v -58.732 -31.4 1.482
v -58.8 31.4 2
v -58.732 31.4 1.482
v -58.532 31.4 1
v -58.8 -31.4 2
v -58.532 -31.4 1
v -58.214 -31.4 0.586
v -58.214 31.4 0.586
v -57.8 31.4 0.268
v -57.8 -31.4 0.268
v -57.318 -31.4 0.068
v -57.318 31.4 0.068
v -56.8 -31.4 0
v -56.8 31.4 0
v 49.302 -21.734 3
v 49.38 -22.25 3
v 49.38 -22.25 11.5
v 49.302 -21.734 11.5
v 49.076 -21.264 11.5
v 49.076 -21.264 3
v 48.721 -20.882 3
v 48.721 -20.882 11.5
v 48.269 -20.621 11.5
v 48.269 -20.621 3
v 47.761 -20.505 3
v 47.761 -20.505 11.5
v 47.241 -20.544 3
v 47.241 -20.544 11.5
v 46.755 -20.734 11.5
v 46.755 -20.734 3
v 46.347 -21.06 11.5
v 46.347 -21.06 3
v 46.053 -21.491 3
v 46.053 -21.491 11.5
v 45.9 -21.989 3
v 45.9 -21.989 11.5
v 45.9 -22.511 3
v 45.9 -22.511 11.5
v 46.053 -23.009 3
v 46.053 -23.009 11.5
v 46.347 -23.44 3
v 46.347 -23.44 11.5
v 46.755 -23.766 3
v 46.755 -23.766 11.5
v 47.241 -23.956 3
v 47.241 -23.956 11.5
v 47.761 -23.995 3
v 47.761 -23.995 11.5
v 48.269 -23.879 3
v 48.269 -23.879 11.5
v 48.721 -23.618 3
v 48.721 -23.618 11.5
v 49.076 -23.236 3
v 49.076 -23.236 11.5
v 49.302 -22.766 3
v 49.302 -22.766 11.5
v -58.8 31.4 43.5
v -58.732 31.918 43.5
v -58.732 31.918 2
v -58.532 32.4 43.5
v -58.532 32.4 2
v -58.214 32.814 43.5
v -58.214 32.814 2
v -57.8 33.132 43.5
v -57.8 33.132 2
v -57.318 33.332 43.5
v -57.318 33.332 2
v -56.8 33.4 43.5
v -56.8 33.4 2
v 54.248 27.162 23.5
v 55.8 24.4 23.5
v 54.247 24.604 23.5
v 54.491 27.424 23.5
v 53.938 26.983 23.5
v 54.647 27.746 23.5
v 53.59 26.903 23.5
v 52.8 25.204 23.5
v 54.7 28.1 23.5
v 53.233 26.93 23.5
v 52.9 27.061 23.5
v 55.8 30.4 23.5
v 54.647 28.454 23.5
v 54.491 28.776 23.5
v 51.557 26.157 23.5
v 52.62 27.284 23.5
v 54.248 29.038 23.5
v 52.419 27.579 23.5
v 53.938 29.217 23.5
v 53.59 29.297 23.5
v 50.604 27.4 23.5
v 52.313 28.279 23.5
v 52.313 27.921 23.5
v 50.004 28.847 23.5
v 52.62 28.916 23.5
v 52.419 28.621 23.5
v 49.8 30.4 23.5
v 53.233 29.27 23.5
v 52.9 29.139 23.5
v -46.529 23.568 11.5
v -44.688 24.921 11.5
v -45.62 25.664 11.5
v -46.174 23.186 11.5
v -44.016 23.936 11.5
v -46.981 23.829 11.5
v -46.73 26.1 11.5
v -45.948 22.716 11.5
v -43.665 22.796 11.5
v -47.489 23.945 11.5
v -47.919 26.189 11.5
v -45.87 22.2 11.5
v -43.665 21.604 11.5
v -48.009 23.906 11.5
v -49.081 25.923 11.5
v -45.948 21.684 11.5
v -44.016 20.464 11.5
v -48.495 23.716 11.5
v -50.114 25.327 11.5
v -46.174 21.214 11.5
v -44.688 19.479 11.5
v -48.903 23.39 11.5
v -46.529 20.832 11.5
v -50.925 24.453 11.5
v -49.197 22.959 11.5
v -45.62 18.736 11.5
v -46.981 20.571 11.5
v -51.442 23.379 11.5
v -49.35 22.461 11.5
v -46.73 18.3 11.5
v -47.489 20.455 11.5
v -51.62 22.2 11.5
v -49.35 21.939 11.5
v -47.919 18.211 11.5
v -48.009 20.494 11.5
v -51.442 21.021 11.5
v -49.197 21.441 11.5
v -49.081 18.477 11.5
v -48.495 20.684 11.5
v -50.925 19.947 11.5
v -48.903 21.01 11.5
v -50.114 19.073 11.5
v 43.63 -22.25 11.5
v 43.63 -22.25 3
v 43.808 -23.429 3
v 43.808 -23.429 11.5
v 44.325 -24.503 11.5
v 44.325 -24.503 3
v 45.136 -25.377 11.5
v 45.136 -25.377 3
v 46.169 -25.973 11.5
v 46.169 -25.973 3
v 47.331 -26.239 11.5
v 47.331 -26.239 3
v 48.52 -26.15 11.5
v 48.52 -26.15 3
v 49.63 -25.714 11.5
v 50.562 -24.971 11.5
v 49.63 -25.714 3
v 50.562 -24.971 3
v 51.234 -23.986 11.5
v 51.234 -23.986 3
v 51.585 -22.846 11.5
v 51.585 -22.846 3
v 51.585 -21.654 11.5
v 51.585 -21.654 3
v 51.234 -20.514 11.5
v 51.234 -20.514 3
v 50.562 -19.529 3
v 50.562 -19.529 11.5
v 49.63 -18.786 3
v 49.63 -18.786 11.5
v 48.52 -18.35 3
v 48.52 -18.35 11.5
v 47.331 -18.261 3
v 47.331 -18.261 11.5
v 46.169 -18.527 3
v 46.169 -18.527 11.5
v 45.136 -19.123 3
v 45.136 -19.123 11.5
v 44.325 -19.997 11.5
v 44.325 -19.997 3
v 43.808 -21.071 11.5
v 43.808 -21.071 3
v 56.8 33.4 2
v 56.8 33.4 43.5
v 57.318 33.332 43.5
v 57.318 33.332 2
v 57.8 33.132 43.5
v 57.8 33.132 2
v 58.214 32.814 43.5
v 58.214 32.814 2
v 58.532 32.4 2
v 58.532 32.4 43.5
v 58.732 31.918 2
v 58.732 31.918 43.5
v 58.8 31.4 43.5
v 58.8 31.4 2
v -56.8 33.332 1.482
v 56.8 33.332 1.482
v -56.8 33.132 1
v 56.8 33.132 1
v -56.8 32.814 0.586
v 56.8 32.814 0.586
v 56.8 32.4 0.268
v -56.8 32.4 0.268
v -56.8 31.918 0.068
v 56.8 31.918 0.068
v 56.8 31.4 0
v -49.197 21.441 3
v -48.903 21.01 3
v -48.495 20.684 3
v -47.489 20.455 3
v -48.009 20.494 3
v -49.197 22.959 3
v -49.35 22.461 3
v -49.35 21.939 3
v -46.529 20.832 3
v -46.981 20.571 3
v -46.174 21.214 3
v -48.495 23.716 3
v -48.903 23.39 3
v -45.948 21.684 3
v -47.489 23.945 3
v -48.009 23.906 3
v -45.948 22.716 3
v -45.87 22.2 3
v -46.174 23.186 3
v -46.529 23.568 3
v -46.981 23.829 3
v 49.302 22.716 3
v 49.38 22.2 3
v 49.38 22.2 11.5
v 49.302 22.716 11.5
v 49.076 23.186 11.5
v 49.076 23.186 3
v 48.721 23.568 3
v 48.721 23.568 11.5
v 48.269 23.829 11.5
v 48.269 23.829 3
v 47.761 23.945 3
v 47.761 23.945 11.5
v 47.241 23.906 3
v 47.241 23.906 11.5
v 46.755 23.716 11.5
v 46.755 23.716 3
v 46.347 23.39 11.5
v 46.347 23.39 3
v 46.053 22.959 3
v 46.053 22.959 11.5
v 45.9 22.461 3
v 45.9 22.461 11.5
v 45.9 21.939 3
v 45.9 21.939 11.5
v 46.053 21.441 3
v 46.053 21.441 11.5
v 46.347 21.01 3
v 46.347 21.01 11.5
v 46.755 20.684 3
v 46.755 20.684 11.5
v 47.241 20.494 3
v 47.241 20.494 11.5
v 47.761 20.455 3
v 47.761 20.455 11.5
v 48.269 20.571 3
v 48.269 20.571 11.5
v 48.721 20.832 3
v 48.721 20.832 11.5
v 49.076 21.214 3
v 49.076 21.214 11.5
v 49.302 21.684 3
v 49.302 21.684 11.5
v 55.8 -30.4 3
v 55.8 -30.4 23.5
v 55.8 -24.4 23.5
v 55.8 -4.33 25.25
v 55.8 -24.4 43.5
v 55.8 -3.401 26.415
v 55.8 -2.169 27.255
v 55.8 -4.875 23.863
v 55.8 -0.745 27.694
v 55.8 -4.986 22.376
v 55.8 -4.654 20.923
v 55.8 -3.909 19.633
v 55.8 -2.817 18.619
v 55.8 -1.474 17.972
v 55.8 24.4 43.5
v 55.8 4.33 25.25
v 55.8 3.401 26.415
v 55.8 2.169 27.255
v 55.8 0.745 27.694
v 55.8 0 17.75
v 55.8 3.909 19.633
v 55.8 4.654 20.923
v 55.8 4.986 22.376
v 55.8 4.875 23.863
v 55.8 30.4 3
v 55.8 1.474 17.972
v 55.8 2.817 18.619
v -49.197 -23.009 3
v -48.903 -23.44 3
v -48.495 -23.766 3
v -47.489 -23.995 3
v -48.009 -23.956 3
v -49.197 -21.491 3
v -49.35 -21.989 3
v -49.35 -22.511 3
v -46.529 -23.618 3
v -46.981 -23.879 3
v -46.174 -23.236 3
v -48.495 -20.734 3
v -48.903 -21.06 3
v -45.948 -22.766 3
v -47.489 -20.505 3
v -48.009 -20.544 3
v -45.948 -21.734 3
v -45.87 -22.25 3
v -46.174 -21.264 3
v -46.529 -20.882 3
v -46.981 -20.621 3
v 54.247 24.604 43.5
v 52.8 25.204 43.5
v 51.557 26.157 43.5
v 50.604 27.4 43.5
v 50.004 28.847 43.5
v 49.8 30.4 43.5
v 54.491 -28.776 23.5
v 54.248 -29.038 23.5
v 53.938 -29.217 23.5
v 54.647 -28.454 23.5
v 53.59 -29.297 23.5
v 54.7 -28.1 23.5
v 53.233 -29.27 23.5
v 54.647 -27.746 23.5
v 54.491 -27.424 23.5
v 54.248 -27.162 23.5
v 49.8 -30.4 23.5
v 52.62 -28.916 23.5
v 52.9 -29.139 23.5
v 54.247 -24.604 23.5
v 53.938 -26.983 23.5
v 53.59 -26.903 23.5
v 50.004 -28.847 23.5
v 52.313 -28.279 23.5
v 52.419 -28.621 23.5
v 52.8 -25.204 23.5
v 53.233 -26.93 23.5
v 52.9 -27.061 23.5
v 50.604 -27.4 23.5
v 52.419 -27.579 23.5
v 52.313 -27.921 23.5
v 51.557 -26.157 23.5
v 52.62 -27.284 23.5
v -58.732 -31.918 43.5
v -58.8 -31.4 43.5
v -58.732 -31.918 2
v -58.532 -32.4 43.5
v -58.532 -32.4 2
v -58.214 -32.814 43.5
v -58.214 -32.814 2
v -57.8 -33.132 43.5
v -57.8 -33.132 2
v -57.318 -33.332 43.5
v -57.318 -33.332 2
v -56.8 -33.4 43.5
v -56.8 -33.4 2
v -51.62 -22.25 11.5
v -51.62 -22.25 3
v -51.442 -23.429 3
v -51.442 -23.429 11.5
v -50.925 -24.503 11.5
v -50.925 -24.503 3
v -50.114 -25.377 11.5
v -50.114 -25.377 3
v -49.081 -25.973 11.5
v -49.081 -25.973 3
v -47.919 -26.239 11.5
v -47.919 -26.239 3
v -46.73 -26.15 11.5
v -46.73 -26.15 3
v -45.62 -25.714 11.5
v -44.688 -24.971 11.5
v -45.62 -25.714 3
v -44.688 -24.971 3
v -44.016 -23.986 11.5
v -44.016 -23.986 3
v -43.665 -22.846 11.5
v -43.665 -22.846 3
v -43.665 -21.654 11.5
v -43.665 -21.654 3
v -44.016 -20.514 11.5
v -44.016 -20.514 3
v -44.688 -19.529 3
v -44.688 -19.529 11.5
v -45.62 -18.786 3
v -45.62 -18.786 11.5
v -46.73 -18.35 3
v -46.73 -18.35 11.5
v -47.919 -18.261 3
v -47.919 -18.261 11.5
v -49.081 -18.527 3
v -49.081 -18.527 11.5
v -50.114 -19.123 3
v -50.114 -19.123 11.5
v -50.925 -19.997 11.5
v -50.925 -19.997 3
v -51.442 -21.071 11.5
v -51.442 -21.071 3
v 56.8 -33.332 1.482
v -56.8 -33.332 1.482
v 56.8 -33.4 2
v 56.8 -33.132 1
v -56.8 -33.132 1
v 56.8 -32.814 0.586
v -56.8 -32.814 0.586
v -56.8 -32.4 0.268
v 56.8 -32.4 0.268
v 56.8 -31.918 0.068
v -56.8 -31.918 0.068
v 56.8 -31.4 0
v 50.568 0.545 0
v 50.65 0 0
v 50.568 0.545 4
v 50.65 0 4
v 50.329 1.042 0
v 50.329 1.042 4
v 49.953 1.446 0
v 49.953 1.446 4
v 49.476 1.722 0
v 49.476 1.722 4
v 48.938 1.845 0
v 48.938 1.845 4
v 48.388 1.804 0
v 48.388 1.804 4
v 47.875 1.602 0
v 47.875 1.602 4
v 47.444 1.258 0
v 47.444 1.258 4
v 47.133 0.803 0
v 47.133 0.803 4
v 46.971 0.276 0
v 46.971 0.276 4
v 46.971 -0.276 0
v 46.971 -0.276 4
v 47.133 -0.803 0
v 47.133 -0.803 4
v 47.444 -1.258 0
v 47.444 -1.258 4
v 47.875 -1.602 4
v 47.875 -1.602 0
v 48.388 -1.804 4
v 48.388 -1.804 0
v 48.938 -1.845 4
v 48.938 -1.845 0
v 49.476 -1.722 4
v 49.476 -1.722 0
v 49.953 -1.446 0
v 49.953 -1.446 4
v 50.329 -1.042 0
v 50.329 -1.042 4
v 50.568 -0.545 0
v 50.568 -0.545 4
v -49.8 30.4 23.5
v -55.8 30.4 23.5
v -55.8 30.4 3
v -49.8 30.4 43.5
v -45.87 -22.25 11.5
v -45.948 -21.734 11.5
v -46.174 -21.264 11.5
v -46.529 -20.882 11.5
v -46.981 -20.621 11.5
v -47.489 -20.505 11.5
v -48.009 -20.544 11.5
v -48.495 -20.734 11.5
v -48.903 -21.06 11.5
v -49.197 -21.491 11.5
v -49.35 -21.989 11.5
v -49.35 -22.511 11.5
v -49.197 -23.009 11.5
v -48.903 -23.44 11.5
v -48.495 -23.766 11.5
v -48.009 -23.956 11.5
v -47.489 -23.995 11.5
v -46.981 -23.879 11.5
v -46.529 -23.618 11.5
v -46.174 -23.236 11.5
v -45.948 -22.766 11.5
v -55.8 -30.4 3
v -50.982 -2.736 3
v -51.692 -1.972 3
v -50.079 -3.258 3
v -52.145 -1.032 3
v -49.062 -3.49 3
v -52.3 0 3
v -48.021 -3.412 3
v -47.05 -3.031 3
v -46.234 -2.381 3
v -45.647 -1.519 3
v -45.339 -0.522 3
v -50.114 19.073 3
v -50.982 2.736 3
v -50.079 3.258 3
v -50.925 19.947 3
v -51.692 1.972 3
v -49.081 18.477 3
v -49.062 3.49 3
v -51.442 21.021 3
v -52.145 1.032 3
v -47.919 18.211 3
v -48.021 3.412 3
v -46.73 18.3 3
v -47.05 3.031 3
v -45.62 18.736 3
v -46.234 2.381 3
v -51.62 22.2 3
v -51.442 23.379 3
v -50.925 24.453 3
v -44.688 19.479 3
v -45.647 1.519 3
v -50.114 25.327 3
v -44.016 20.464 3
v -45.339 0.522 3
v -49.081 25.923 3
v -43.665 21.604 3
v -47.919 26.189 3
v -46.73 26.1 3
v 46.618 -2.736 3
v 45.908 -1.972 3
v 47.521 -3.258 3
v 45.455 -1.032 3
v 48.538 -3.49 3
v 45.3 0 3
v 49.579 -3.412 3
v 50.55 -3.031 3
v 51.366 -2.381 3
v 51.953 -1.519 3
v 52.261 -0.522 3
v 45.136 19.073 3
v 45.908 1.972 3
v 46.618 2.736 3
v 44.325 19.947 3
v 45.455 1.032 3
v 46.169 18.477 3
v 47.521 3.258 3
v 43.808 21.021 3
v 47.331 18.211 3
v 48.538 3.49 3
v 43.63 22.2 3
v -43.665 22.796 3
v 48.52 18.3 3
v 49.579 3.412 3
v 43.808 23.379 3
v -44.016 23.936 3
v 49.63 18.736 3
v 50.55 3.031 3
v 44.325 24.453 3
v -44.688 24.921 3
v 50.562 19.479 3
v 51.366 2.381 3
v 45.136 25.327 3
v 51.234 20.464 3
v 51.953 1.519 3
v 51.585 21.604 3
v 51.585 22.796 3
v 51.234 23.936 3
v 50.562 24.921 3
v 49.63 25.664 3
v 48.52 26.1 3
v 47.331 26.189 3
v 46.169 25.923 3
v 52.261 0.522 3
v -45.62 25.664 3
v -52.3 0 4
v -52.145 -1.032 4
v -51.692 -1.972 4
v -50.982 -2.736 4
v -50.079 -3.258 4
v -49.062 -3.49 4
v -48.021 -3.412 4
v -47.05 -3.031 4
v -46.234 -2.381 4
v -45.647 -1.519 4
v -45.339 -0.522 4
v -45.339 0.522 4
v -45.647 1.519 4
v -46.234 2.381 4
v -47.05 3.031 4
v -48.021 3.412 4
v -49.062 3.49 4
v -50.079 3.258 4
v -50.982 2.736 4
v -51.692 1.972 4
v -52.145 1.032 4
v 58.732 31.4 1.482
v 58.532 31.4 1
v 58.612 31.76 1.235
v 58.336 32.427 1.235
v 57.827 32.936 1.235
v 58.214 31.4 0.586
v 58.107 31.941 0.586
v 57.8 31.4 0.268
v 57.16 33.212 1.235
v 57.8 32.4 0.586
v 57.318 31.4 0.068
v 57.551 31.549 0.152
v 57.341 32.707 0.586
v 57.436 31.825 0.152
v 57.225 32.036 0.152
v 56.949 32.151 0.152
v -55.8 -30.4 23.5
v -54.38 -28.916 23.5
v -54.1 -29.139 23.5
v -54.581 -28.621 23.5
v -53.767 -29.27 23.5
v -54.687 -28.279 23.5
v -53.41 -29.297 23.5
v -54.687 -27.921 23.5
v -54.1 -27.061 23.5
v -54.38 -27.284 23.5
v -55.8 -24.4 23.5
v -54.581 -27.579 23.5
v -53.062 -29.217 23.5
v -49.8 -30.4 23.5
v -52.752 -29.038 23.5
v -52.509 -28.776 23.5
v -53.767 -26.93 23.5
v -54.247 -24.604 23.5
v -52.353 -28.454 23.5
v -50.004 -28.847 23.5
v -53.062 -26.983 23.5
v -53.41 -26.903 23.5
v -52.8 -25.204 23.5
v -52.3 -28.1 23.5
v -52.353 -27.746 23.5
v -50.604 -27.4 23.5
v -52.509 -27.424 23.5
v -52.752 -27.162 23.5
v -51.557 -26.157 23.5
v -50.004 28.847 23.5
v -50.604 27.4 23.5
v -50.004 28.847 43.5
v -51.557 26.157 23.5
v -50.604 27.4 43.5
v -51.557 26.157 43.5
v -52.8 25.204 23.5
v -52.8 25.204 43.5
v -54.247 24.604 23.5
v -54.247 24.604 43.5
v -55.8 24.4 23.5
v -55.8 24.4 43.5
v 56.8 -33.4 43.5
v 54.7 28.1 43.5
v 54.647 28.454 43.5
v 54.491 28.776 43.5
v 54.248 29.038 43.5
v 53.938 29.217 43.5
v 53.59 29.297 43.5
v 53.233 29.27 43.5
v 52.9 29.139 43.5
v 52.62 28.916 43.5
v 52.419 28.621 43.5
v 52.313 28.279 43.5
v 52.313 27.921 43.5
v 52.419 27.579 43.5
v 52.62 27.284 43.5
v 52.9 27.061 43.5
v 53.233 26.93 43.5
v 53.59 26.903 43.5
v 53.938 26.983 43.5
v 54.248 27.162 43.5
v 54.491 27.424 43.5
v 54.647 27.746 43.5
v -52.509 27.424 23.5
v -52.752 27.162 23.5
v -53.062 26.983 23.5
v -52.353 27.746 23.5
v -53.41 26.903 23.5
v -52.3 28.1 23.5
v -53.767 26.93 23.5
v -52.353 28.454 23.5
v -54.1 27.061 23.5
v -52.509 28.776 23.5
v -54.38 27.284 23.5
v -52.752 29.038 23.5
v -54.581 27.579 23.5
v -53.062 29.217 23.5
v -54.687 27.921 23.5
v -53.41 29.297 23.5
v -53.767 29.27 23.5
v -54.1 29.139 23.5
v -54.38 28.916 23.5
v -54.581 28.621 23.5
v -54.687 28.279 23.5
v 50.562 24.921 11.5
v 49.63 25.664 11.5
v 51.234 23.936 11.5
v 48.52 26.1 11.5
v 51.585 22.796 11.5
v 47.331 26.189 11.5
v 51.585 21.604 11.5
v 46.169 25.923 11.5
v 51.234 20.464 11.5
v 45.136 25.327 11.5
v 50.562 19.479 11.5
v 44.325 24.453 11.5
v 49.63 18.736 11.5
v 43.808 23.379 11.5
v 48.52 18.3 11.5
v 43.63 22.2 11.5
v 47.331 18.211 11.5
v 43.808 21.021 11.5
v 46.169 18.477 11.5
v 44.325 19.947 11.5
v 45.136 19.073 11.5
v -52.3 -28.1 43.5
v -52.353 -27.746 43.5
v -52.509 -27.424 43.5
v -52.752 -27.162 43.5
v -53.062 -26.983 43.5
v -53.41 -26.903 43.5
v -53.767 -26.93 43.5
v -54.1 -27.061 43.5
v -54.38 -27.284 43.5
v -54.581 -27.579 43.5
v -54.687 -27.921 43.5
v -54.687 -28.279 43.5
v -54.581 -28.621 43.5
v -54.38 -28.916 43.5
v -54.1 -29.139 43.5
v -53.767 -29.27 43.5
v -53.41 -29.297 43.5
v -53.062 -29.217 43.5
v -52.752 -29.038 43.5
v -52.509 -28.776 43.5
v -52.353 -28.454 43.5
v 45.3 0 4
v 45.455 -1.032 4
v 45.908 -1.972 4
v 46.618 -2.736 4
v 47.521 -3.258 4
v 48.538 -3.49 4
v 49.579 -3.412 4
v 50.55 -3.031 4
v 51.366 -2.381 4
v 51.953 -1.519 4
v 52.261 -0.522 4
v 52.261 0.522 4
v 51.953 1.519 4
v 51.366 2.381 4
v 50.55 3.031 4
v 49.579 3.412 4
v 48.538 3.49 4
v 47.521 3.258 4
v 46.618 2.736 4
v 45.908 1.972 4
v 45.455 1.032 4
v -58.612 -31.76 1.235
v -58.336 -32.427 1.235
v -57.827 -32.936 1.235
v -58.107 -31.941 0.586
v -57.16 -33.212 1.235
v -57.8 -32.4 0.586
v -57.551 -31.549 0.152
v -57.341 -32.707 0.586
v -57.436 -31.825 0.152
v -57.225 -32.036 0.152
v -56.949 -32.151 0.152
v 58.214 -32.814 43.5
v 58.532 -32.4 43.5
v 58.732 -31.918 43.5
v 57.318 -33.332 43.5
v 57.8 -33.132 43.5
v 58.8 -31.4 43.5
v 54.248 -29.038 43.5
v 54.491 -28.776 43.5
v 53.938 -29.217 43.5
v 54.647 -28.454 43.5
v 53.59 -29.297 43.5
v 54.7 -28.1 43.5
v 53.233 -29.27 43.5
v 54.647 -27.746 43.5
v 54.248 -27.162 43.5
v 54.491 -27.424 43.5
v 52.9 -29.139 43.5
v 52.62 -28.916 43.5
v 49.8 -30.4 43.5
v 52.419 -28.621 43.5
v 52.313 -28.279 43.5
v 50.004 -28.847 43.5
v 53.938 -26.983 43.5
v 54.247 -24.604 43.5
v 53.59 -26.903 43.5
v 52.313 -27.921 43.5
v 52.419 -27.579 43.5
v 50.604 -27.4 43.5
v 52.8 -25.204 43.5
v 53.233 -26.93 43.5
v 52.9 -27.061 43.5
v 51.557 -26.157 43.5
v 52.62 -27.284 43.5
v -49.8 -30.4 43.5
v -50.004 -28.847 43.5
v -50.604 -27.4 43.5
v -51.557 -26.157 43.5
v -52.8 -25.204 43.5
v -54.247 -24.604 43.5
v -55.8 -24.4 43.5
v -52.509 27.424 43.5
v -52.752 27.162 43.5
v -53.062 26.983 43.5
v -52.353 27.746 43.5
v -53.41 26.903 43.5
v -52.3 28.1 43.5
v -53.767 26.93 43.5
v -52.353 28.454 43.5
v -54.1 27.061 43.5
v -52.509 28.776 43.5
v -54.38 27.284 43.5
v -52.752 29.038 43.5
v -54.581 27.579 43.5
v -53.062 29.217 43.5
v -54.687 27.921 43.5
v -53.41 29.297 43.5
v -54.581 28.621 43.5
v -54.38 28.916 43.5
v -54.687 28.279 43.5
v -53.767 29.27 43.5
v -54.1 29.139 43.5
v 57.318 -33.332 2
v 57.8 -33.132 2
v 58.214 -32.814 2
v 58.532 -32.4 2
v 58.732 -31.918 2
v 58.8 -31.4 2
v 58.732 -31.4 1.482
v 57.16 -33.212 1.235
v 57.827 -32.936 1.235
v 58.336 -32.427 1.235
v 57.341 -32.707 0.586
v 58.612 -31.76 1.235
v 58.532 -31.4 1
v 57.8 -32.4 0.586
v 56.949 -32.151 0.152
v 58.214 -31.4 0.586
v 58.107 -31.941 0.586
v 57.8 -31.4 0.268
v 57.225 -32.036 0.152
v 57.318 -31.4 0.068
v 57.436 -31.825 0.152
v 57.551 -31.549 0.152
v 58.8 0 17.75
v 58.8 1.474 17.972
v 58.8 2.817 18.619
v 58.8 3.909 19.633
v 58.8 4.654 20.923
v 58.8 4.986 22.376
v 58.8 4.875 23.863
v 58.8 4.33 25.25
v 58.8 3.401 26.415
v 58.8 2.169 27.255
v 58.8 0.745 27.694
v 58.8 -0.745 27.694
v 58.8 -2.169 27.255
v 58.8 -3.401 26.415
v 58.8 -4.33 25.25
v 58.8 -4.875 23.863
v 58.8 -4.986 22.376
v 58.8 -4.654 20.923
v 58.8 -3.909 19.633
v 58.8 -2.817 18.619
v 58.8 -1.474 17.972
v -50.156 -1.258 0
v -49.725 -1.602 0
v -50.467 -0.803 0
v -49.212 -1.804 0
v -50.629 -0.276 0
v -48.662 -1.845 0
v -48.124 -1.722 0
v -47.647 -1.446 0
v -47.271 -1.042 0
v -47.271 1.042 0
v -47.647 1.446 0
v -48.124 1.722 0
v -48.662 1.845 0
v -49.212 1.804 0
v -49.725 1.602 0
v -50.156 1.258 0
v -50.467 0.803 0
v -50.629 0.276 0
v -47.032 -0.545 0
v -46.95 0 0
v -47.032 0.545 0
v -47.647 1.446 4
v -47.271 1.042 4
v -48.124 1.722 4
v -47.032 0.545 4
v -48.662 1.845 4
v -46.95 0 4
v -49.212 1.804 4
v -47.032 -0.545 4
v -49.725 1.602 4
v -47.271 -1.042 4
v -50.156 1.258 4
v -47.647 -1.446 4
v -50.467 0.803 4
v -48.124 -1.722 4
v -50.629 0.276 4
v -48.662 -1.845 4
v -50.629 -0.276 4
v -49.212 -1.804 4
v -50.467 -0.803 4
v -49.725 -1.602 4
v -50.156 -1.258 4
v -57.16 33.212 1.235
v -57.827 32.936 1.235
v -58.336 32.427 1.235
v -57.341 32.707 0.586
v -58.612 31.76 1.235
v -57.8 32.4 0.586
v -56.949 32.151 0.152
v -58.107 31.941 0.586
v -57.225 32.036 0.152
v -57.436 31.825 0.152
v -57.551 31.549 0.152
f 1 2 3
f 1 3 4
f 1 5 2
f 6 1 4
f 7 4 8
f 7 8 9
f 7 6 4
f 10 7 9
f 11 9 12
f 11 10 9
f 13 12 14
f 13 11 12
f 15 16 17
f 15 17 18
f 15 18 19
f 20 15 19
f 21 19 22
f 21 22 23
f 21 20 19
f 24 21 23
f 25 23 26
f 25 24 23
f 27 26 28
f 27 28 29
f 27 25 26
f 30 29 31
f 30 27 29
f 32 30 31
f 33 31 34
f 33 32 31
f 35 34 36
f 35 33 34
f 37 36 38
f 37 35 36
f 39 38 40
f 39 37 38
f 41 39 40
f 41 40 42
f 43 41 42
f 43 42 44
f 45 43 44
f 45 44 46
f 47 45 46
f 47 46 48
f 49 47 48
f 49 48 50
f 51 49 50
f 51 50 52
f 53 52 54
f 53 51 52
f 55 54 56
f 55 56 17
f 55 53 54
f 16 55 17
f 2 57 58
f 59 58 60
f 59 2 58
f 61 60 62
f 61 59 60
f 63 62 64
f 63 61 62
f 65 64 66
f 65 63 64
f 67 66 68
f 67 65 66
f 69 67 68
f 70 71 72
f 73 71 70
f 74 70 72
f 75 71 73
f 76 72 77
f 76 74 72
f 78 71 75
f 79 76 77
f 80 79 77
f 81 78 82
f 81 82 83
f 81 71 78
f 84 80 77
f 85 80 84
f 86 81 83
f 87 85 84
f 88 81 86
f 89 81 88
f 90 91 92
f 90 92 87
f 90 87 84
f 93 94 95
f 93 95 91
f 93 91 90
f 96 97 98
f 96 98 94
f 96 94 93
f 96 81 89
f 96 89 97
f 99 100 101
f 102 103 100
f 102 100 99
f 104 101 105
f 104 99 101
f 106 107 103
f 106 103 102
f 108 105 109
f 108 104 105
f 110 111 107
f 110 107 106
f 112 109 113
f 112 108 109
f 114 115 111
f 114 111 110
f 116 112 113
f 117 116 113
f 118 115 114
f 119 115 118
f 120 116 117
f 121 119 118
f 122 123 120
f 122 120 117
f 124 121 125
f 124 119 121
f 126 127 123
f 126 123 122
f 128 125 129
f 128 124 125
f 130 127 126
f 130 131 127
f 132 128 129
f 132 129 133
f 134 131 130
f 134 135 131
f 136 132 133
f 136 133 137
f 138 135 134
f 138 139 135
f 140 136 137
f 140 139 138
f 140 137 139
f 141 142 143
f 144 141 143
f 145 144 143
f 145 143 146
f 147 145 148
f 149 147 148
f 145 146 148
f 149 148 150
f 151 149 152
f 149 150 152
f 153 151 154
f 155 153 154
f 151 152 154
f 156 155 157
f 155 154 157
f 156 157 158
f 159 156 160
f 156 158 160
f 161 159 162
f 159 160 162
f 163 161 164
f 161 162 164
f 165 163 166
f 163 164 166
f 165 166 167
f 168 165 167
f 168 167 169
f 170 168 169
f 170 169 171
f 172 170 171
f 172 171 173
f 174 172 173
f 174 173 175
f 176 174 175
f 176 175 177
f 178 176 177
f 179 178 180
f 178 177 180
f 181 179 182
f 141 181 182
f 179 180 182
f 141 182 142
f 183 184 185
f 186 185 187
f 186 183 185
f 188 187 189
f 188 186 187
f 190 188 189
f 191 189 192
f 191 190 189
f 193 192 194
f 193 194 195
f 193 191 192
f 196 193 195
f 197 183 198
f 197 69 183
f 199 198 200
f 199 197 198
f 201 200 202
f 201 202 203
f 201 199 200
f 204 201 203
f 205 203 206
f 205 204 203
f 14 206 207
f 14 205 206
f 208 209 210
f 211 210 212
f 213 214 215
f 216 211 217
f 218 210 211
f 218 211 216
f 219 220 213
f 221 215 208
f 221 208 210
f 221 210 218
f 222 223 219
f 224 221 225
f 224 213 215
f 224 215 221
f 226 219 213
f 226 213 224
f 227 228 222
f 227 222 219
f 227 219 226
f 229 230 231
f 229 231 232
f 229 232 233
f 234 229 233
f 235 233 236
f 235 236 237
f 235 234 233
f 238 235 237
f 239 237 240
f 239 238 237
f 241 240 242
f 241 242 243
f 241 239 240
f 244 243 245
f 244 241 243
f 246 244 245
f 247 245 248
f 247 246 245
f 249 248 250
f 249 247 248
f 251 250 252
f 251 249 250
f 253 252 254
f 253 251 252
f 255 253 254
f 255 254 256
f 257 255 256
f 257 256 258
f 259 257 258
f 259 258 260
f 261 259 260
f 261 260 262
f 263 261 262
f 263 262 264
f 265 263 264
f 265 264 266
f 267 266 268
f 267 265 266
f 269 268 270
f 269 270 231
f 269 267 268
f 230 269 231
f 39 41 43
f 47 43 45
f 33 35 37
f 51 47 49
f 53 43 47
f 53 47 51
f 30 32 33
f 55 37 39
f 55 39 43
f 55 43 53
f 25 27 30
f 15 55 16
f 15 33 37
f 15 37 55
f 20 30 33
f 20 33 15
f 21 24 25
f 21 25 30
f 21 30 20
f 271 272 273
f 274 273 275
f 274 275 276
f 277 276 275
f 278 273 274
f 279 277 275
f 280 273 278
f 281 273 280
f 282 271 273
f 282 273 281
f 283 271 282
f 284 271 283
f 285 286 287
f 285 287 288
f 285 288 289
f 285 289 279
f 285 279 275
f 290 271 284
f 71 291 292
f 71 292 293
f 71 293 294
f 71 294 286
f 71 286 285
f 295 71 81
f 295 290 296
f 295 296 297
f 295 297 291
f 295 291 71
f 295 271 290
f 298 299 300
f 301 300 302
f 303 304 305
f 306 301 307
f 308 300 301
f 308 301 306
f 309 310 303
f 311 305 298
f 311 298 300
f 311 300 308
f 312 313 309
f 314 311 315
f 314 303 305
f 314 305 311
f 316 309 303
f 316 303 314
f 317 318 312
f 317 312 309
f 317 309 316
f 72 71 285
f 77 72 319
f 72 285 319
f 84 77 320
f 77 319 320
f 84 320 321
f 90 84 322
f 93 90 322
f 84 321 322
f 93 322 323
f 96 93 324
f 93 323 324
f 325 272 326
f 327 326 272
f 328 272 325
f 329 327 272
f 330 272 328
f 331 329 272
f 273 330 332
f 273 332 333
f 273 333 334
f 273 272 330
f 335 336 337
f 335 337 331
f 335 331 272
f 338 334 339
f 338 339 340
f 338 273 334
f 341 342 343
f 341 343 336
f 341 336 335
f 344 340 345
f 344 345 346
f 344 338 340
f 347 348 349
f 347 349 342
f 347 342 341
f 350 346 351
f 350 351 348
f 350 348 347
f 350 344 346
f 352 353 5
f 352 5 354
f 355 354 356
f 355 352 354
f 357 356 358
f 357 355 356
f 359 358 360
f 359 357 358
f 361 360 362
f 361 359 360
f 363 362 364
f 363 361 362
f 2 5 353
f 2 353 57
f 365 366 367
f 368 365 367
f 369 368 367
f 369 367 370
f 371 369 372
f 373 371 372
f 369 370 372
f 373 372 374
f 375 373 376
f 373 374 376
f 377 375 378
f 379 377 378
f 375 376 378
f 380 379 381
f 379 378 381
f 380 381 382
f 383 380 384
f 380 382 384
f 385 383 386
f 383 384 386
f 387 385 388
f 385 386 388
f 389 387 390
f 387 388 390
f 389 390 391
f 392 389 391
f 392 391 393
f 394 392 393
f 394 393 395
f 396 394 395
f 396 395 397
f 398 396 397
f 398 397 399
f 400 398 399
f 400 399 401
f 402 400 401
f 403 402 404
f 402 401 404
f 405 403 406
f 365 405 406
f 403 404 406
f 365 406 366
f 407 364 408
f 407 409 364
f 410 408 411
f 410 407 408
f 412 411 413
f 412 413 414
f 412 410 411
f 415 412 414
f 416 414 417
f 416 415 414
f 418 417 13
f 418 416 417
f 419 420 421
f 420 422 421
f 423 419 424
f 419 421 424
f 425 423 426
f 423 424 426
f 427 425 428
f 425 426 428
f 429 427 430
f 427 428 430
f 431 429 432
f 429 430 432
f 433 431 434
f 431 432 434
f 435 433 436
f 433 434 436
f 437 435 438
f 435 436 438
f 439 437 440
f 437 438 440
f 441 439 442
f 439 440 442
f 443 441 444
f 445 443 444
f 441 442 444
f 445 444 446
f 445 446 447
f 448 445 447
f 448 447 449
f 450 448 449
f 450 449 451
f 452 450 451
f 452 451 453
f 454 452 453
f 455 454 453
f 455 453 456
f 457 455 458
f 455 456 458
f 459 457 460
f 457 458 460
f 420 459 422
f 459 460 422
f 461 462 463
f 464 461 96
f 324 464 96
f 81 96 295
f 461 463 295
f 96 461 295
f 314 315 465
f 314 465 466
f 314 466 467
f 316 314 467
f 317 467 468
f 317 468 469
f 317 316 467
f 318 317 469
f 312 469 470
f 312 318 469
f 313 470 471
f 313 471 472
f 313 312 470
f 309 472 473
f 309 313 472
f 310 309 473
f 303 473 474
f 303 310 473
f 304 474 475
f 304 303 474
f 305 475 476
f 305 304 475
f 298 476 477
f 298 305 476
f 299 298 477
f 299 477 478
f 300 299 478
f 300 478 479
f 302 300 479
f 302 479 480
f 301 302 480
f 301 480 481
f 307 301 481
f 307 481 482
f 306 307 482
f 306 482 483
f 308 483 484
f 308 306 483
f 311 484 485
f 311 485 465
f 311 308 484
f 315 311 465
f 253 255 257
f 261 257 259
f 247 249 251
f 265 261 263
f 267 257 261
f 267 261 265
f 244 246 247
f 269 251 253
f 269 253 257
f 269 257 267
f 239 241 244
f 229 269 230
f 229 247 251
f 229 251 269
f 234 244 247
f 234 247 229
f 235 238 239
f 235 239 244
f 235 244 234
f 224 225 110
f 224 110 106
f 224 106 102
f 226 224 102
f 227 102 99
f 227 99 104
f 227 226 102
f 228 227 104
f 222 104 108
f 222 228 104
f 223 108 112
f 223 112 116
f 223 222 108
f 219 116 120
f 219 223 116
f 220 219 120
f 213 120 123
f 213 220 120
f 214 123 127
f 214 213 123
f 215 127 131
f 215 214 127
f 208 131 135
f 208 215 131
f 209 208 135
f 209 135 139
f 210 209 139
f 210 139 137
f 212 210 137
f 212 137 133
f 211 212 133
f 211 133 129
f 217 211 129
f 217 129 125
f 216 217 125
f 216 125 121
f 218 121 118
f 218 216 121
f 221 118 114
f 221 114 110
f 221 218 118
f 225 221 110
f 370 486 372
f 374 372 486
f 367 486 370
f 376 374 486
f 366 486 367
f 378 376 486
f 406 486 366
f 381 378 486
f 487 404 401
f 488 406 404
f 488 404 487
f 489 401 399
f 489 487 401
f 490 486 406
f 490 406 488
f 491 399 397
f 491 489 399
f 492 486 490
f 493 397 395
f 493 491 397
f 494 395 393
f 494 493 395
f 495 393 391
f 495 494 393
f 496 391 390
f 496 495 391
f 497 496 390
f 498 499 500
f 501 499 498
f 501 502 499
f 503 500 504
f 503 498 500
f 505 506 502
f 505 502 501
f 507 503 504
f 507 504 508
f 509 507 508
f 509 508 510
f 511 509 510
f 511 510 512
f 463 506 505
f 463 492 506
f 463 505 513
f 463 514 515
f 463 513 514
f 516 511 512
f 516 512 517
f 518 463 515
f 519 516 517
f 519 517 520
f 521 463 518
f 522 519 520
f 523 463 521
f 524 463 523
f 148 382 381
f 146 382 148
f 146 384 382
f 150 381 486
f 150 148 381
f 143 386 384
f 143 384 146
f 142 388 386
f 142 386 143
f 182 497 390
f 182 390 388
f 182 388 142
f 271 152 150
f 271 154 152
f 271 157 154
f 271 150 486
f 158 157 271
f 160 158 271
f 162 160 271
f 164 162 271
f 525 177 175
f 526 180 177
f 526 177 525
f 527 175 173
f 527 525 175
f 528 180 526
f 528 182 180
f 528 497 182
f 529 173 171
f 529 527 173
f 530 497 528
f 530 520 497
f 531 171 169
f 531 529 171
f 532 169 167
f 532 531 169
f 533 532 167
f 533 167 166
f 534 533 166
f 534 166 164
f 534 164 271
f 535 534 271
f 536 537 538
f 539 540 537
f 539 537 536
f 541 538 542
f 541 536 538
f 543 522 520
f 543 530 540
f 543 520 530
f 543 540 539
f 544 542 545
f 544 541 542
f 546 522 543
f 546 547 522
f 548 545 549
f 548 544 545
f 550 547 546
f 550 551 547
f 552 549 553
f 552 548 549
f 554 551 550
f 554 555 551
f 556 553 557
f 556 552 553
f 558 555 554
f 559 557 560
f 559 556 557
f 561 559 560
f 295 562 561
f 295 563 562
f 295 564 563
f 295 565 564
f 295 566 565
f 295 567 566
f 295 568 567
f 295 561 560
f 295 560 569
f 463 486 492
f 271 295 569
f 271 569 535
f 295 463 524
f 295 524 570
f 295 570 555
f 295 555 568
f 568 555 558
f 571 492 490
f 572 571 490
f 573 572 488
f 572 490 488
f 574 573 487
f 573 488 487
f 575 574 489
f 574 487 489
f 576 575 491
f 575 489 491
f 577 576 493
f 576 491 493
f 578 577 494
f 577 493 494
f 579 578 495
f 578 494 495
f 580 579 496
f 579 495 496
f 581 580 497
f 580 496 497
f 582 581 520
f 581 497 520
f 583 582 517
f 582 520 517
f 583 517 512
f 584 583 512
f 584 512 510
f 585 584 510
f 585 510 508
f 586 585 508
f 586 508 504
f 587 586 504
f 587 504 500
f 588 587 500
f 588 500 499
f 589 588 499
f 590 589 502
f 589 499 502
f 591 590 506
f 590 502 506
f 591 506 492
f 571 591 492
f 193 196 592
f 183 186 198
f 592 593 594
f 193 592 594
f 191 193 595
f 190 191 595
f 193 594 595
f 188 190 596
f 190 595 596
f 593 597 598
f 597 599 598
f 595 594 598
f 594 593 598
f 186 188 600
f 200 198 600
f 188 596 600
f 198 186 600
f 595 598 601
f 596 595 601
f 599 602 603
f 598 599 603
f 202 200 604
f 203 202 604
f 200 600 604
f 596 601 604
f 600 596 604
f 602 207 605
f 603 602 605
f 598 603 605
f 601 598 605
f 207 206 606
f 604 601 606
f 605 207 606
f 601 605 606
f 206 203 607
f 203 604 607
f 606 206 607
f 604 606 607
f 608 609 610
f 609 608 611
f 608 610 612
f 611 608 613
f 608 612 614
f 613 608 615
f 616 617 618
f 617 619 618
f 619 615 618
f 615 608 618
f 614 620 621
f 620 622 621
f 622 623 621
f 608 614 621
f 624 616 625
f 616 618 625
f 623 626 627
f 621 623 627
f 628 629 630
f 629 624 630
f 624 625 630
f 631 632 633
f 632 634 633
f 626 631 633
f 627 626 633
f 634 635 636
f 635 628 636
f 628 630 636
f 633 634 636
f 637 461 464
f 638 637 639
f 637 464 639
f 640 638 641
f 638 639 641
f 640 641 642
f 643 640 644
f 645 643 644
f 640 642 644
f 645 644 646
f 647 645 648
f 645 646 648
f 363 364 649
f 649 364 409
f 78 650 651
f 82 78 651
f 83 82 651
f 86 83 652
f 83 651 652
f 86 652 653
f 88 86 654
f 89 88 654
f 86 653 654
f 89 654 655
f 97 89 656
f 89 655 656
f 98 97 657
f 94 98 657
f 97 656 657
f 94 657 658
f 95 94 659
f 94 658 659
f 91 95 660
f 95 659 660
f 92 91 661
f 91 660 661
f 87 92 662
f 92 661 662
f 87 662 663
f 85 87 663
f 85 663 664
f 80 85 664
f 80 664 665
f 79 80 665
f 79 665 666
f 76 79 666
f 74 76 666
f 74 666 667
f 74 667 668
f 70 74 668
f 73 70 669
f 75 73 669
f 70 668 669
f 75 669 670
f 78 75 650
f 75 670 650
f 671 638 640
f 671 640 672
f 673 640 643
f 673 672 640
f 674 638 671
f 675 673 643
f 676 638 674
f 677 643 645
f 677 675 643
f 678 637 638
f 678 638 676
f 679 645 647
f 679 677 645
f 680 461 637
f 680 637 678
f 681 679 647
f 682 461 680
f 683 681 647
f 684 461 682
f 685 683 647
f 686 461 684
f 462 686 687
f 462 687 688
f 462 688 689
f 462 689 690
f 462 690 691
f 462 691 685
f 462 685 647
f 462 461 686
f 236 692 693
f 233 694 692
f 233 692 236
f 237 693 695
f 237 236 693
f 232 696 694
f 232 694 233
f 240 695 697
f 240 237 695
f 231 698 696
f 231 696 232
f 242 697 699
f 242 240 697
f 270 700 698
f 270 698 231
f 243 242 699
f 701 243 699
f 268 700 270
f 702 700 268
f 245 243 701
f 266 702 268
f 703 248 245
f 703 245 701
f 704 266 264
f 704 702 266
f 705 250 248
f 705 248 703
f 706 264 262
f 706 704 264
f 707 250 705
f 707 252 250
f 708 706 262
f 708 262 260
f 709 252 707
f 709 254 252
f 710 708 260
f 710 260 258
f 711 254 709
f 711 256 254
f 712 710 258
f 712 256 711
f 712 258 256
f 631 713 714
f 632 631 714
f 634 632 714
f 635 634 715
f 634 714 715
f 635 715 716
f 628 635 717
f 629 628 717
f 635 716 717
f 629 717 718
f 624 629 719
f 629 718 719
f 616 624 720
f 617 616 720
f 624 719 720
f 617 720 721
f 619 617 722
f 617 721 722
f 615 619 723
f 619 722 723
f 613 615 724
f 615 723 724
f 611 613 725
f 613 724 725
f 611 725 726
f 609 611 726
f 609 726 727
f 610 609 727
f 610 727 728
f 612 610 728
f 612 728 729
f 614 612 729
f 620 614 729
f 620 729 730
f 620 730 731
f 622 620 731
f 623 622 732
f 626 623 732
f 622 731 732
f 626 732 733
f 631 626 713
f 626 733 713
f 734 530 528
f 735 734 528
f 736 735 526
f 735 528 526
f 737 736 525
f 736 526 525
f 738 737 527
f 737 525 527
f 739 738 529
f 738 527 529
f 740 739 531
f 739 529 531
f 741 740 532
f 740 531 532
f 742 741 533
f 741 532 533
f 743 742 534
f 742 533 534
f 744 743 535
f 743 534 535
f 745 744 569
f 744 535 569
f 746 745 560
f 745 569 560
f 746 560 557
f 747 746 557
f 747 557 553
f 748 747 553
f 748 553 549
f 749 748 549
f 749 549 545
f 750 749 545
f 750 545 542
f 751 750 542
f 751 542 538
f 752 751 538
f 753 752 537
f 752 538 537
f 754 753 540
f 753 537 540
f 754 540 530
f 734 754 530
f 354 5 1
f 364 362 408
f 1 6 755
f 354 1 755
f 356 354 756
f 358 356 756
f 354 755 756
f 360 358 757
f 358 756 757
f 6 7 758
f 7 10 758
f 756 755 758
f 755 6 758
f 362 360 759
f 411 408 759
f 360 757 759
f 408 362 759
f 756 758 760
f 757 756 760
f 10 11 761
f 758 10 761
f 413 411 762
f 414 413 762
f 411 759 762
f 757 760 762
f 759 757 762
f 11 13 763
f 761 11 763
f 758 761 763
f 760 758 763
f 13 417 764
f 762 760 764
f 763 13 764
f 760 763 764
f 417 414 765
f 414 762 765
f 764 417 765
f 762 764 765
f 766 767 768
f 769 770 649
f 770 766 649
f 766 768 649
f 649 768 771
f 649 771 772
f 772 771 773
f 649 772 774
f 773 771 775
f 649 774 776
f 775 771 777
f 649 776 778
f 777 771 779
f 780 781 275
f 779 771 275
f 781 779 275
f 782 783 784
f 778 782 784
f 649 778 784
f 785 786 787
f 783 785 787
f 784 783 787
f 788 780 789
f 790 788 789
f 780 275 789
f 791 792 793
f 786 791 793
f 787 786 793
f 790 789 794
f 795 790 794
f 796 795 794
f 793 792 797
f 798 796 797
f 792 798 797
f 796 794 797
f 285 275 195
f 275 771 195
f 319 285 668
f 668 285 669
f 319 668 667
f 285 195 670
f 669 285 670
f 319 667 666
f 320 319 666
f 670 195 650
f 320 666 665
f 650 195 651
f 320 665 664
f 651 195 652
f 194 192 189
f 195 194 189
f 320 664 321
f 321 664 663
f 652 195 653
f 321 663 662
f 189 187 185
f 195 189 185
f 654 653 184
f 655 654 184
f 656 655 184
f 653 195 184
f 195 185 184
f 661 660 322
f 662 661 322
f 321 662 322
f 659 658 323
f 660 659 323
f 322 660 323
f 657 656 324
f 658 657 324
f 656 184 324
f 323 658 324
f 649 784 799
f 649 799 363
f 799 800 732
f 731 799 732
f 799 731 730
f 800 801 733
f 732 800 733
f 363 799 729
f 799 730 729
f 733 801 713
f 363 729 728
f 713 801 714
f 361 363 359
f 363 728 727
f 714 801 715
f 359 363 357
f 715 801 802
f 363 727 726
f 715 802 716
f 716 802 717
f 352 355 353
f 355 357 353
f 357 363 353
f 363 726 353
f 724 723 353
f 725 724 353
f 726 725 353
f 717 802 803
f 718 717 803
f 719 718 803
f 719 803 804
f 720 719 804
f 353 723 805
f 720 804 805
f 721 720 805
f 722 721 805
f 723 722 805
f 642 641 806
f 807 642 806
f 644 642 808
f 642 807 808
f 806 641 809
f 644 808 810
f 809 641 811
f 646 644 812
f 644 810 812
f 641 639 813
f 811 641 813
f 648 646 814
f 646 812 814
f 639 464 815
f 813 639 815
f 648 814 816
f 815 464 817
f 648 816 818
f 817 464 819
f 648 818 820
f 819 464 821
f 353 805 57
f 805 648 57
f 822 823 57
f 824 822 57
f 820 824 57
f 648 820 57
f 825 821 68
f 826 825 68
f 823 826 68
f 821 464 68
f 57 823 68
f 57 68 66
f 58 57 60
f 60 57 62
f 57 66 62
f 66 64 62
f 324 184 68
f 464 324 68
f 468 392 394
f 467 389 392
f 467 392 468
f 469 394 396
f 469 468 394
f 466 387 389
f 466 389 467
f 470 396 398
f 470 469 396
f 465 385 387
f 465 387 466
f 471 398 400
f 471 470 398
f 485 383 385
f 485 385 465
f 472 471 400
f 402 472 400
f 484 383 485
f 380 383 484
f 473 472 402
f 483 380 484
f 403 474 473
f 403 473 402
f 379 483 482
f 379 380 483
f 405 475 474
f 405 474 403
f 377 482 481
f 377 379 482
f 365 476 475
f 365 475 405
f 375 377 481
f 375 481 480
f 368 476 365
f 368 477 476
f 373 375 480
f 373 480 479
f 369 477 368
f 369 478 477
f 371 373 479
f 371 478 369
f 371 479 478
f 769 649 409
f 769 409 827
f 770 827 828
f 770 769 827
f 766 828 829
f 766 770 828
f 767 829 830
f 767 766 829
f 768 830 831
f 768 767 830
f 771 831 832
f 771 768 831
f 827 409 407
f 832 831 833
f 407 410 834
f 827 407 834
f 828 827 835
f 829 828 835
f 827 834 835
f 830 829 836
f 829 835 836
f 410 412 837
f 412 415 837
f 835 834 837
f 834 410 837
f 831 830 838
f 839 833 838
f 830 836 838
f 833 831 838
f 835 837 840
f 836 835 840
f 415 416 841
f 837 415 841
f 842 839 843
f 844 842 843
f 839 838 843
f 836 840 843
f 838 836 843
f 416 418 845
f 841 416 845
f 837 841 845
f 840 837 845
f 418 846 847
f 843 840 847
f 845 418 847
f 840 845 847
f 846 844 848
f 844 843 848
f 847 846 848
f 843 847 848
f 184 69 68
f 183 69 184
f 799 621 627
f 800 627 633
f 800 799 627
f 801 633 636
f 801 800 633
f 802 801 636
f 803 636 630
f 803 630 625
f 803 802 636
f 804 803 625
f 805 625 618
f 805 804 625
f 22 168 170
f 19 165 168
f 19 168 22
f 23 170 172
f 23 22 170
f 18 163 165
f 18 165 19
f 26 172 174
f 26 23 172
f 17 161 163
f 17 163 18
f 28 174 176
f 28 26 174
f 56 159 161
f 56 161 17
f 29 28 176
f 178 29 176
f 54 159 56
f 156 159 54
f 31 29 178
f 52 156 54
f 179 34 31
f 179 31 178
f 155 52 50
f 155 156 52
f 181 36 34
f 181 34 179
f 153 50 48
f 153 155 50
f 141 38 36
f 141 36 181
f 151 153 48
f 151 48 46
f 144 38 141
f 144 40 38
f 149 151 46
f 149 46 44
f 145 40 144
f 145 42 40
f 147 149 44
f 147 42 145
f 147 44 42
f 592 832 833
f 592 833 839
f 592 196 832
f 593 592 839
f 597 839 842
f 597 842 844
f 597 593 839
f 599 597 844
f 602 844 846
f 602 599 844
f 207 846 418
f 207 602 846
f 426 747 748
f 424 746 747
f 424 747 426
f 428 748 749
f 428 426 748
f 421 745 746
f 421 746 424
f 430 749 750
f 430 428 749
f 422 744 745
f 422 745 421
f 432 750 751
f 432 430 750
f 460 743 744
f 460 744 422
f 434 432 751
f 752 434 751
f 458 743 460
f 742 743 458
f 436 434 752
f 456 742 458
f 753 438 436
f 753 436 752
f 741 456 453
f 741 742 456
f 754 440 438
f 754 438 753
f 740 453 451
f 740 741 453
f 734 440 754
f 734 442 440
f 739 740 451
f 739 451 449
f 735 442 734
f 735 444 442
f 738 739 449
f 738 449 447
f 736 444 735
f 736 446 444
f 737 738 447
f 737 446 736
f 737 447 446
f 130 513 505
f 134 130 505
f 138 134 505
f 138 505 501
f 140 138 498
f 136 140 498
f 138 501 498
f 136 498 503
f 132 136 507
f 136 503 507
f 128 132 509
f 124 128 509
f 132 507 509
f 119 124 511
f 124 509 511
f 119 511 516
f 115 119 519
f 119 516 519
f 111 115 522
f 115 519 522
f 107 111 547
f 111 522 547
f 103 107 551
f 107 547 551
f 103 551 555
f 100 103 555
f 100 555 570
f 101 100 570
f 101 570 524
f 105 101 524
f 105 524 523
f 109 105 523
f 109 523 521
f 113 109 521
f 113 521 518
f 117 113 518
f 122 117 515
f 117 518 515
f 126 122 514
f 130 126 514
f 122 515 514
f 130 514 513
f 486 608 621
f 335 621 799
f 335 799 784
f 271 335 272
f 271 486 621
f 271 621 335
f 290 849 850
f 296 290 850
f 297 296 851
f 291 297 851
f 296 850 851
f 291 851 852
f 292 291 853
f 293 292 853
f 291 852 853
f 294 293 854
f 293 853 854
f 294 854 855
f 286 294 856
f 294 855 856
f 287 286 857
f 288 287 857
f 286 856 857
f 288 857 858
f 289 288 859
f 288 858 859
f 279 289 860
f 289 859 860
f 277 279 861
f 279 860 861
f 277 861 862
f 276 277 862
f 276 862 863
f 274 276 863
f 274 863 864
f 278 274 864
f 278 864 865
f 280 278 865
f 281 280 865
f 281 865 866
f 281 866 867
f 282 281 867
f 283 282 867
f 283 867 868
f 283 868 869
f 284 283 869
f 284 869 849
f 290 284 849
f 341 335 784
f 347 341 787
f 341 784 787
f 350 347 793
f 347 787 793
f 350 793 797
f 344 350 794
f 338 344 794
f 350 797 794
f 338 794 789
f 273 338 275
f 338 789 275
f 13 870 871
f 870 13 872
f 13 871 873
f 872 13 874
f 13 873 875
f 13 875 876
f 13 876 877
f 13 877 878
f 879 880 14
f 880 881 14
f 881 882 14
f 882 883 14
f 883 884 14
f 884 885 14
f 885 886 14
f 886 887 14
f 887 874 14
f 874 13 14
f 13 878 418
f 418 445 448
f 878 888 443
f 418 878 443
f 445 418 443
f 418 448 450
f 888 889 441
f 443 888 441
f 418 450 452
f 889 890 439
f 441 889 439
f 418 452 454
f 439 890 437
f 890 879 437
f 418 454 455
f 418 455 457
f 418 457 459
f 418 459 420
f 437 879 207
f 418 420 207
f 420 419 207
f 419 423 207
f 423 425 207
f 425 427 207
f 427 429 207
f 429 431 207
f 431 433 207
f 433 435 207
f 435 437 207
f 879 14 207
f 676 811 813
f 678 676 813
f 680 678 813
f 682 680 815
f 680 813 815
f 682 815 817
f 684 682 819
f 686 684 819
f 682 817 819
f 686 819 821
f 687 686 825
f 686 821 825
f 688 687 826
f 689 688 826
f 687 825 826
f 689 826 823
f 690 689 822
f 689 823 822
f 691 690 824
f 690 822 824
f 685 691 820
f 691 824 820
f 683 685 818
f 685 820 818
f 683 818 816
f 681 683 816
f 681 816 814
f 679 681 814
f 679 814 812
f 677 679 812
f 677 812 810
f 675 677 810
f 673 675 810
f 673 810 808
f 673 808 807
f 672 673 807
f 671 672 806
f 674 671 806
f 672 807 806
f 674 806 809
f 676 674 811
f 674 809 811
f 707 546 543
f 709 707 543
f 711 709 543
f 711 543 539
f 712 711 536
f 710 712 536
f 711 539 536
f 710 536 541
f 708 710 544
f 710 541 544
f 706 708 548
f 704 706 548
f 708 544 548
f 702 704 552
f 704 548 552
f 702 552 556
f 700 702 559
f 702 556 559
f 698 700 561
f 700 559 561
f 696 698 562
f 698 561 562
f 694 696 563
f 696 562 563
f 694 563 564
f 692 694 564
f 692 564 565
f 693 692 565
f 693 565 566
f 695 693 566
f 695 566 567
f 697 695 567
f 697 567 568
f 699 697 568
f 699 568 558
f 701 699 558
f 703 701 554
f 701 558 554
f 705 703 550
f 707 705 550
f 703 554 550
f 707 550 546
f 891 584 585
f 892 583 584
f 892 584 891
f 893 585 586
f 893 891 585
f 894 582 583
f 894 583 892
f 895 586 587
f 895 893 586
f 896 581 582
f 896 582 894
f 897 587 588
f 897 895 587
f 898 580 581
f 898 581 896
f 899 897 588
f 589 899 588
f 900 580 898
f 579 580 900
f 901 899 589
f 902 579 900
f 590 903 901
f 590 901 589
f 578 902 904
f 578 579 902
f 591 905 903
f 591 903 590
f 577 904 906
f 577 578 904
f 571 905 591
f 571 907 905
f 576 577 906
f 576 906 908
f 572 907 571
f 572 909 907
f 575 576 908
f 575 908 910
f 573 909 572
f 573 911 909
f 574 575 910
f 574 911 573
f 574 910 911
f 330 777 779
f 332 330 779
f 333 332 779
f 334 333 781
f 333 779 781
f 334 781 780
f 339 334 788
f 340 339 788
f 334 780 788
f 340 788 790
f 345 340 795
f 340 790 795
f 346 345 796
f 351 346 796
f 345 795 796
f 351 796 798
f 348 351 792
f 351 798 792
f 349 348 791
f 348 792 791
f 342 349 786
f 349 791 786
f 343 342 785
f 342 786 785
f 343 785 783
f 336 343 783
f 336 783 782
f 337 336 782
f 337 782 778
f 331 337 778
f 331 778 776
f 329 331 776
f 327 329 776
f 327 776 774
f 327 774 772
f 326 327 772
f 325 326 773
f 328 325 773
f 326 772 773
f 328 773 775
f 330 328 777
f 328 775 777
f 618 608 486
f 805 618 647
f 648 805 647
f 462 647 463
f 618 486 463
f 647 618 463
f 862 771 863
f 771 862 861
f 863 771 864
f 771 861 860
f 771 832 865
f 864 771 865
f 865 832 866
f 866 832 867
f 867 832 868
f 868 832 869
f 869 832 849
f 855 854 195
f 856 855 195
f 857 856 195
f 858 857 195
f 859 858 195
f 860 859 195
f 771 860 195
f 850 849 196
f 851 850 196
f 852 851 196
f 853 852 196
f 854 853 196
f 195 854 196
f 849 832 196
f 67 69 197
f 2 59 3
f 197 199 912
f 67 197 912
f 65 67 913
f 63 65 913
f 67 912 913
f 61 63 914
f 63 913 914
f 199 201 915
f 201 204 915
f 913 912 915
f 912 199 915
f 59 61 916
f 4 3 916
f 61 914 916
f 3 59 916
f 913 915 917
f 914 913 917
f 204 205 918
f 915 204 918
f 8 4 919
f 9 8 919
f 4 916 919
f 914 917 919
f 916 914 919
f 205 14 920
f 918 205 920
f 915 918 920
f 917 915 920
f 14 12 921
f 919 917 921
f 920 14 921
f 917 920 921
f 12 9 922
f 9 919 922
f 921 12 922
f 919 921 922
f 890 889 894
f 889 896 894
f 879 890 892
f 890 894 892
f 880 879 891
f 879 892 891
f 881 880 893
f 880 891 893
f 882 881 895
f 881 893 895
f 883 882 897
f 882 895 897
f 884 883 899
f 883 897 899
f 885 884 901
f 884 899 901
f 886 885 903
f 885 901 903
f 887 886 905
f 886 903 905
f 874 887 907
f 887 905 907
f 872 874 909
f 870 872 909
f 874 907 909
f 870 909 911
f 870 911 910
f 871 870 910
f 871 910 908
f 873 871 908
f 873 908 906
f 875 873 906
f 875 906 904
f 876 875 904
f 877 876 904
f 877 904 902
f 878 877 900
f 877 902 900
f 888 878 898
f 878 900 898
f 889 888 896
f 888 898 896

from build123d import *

# Parameters (mm, degrees)
SCHIZZO1_W                           = 117.6
SCHIZZO1_H                           = 66.8
ESTRUSIONE_ESTRUSIONE1_DEPTH         = 3
SCHIZZO2_W                           = 117.6
SCHIZZO2_H                           = 66.8
SCHIZZO2_W_2                         = 111.6
SCHIZZO2_H_2                         = 60.8
ESTRUSIONE_FORI_COVER_DEPTH          = 40.5
SCHIZZO4_R                           = 4
SCHIZZO4_R_2                         = 1.75
ESTRUSIONE_FORI_PCB_DEPTH            = 8.5
SCHIZZO7_R                           = 3.5
ESTRUSIONE_FORI_CHASSIS_DEPTH        = 1
SCHIZZO8_R                           = 1.85
TAGLIO_ESTRUSIONE2_DEPTH             = 79.82417142
TAGLIO_ESTRUSIONE2_DIRECTION_2_REACH = 80.824
RACCORDO3_R                          = 2
RACCORDO4_R                          = 2
RACCORDO5_R                          = 2
RACCORDO6_R                          = 2
RACCORDO7_R                          = 2
SCHIZZO9_R                           = 1.2
ESTRUSIONE_ESTRUSIONE6_DEPTH         = 20
TAGLIO_FORO_CAVI_REACH               = 131.76
SCHIZZO11_R                          = 5


with BuildPart() as part:
    # Schizzo1 → Estrusione-Estrusione1 (new body)
    with BuildSketch(Plane.XY):
        Rectangle(SCHIZZO1_W, SCHIZZO1_H)
    extrude(amount=ESTRUSIONE_ESTRUSIONE1_DEPTH)

    # Schizzo2 → Estrusione- Fori Cover (add)
    with BuildSketch(Plane.XY.offset(3)):
        Rectangle(SCHIZZO2_W, SCHIZZO2_H)
        Rectangle(SCHIZZO2_W_2, SCHIZZO2_H_2, mode=Mode.SUBTRACT)
    extrude(amount=ESTRUSIONE_FORI_COVER_DEPTH)

    # Schizzo4 → Estrusione- Fori PCB (add)
    # profile 1 of 4: a face of its own
    with BuildSketch(Plane.XY.offset(3)):
        with Locations(Location((-47.62, 22.2, 0), (0, 0, 180))):
            Circle(SCHIZZO4_R)
        with Locations((-47.62, 22.2)):
            Circle(SCHIZZO4_R_2, mode=Mode.SUBTRACT)
    # profile 2 of 4: a face of its own
    with BuildSketch(Plane.XY.offset(3)):
        with Locations(Location((47.63, 22.2, 0), (0, 0, 180))):
            Circle(SCHIZZO4_R)
        with Locations((47.63, 22.2)):
            Circle(SCHIZZO4_R_2, mode=Mode.SUBTRACT)
    # profile 3 of 4: a face of its own
    with BuildSketch(Plane.XY.offset(3)):
        with Locations(Location((47.63, -22.25, 0), (0, 0, 180))):
            Circle(SCHIZZO4_R)
        with Locations((47.63, -22.25)):
            Circle(SCHIZZO4_R_2, mode=Mode.SUBTRACT)
    # profile 4 of 4: a face of its own
    with BuildSketch(Plane.XY.offset(3)):
        with Locations(Location((-47.62, -22.25, 0), (0, 0, 180))):
            Circle(SCHIZZO4_R)
        with Locations((-47.62, -22.25)):
            Circle(SCHIZZO4_R_2, mode=Mode.SUBTRACT)
    extrude(amount=ESTRUSIONE_FORI_PCB_DEPTH)

    # Schizzo7 → Estrusione-Fori Chassis (add)
    with BuildSketch(Plane.XY.offset(3)):
        with Locations(Location((-48.8, 0, 0), (0, 0, 180))):
            Circle(SCHIZZO7_R)
        with Locations(Location((48.8, 0, 0), (0, 0, 180))):
            Circle(SCHIZZO7_R)
    extrude(amount=ESTRUSIONE_FORI_CHASSIS_DEPTH)

    # Schizzo8 → Taglio-Estrusione2 (cut)
    with BuildSketch(Plane.XY.offset(3)):
        with Locations((-48.8, 0)):
            Circle(SCHIZZO8_R)
        with Locations((48.8, 0)):
            Circle(SCHIZZO8_R)
    extrude(amount=-TAGLIO_ESTRUSIONE2_DEPTH, mode=Mode.SUBTRACT)

    # Schizzo8 → Taglio-Estrusione2 direction 2 (cut, up to next)
    with BuildSketch(Plane.XY.offset(3), mode=Mode.PRIVATE) as taglio_estrusione2_direction_2_sk1:
        with Locations((-48.8, 0)):
            Circle(SCHIZZO8_R)
    taglio_estrusione2_direction_2_tool1 = extrude(taglio_estrusione2_direction_2_sk1.sketch, amount=TAGLIO_ESTRUSIONE2_DIRECTION_2_REACH, mode=Mode.PRIVATE) & part.part
    # Schizzo8 → Taglio-Estrusione2 direction 2 (cut, up to next)
    with BuildSketch(Plane.XY.offset(3), mode=Mode.PRIVATE) as taglio_estrusione2_direction_2_sk2:
        with Locations((48.8, 0)):
            Circle(SCHIZZO8_R)
    taglio_estrusione2_direction_2_tool2 = extrude(taglio_estrusione2_direction_2_sk2.sketch, amount=TAGLIO_ESTRUSIONE2_DIRECTION_2_REACH, mode=Mode.PRIVATE) & part.part
    add(taglio_estrusione2_direction_2_tool1.solids().sort_by_distance((-48.8, 0, 3))[0], mode=Mode.SUBTRACT)
    add(taglio_estrusione2_direction_2_tool2.solids().sort_by_distance((48.8, 0, 3))[0], mode=Mode.SUBTRACT)

    # Raccordo3
    raccordo3_edges = [part.edges().sort_by_distance(p)[0] for p in [
        (-58.8, 33.4, 21.75),
    ]]
    fillet(raccordo3_edges, radius=RACCORDO3_R)

    # Raccordo4
    raccordo4_edges = [part.edges().sort_by_distance(p)[0] for p in [
        (58.8, 33.4, 21.75),
    ]]
    fillet(raccordo4_edges, radius=RACCORDO4_R)

    # Raccordo5
    raccordo5_edges = [part.edges().sort_by_distance(p)[0] for p in [
        (-58.8, -33.4, 21.75),
    ]]
    fillet(raccordo5_edges, radius=RACCORDO5_R)

    # Raccordo6
    raccordo6_edges = [part.edges().sort_by_distance(p)[0] for p in [
        (58.8, -33.4, 21.75),
    ]]
    fillet(raccordo6_edges, radius=RACCORDO6_R)

    # Raccordo7
    raccordo7_edges = [part.edges().sort_by_distance(p)[0] for p in [
        (0, -33.4, 0),
        (-58.214213562, -32.814213562, 0),
        (58.8, 0, 0),
        (58.214213562, -32.814213562, 0),
        (-58.8, 0, 0),
        (-58.214213562, 32.814213562, 0),
        (0, 33.4, 0),
        (58.214213562, 32.814213562, 0),
    ]]
    fillet(raccordo7_edges, radius=RACCORDO7_R)

    # Schizzo9 → Estrusione-Estrusione6 (add)
    # profile 1 of 4: a face of its own
    with BuildSketch(Plane.XY.offset(43.5)):
        with BuildLine():
            Line((-55.8, 24.4), (-55.8, 30.4))
            Line((-55.8, 30.4), (-49.8, 30.4))
            ThreePointArc((-49.8, 30.4), (-51.557359313, 26.157359313), (-55.8, 24.4))
        make_face()
        with Locations((-53.5, 28.1)):
            Circle(SCHIZZO9_R, mode=Mode.SUBTRACT)
    # profile 2 of 4: a face of its own
    with BuildSketch(Plane.XY.offset(43.5)):
        with BuildLine():
            Line((49.8, 30.4), (55.8, 30.4))
            Line((55.8, 30.4), (55.8, 24.4))
            ThreePointArc((55.8, 24.4), (51.557359313, 26.157359313), (49.8, 30.4))
        make_face()
        with Locations((53.5, 28.1)):
            Circle(SCHIZZO9_R, mode=Mode.SUBTRACT)
    # profile 3 of 4: a face of its own
    with BuildSketch(Plane.XY.offset(43.5)):
        with BuildLine():
            Line((55.8, -24.4), (55.8, -30.4))
            Line((55.8, -30.4), (49.8, -30.4))
            ThreePointArc((49.8, -30.4), (51.557359313, -26.157359313), (55.8, -24.4))
        make_face()
        with Locations((53.5, -28.1)):
            Circle(SCHIZZO9_R, mode=Mode.SUBTRACT)
    # profile 4 of 4: a face of its own
    with BuildSketch(Plane.XY.offset(43.5)):
        with BuildLine():
            Line((-55.8, -24.4), (-55.8, -30.4))
            Line((-55.8, -30.4), (-49.8, -30.4))
            ThreePointArc((-49.8, -30.4), (-51.557359313, -26.157359313), (-55.8, -24.4))
        make_face()
        with Locations((-53.5, -28.1)):
            Circle(SCHIZZO9_R, mode=Mode.SUBTRACT)
    extrude(amount=-ESTRUSIONE_ESTRUSIONE6_DEPTH)

    # Schizzo11 → Taglio- Foro Cavi (cut, up to next)
    with BuildSketch(Plane(origin=(58.8, 0, 0), x_dir=(0, 0, -1), z_dir=(1, 0, 0)), mode=Mode.PRIVATE) as taglio_foro_cavi_sk1:
        with Locations((-22.75, 0)):
            Circle(SCHIZZO11_R)
    taglio_foro_cavi_tool1 = extrude(taglio_foro_cavi_sk1.sketch, amount=-TAGLIO_FORO_CAVI_REACH, mode=Mode.PRIVATE) & part.part
    add(taglio_foro_cavi_tool1.solids().sort_by_distance((58.8, 0, 22.75))[0], mode=Mode.SUBTRACT)


solid = part.part
